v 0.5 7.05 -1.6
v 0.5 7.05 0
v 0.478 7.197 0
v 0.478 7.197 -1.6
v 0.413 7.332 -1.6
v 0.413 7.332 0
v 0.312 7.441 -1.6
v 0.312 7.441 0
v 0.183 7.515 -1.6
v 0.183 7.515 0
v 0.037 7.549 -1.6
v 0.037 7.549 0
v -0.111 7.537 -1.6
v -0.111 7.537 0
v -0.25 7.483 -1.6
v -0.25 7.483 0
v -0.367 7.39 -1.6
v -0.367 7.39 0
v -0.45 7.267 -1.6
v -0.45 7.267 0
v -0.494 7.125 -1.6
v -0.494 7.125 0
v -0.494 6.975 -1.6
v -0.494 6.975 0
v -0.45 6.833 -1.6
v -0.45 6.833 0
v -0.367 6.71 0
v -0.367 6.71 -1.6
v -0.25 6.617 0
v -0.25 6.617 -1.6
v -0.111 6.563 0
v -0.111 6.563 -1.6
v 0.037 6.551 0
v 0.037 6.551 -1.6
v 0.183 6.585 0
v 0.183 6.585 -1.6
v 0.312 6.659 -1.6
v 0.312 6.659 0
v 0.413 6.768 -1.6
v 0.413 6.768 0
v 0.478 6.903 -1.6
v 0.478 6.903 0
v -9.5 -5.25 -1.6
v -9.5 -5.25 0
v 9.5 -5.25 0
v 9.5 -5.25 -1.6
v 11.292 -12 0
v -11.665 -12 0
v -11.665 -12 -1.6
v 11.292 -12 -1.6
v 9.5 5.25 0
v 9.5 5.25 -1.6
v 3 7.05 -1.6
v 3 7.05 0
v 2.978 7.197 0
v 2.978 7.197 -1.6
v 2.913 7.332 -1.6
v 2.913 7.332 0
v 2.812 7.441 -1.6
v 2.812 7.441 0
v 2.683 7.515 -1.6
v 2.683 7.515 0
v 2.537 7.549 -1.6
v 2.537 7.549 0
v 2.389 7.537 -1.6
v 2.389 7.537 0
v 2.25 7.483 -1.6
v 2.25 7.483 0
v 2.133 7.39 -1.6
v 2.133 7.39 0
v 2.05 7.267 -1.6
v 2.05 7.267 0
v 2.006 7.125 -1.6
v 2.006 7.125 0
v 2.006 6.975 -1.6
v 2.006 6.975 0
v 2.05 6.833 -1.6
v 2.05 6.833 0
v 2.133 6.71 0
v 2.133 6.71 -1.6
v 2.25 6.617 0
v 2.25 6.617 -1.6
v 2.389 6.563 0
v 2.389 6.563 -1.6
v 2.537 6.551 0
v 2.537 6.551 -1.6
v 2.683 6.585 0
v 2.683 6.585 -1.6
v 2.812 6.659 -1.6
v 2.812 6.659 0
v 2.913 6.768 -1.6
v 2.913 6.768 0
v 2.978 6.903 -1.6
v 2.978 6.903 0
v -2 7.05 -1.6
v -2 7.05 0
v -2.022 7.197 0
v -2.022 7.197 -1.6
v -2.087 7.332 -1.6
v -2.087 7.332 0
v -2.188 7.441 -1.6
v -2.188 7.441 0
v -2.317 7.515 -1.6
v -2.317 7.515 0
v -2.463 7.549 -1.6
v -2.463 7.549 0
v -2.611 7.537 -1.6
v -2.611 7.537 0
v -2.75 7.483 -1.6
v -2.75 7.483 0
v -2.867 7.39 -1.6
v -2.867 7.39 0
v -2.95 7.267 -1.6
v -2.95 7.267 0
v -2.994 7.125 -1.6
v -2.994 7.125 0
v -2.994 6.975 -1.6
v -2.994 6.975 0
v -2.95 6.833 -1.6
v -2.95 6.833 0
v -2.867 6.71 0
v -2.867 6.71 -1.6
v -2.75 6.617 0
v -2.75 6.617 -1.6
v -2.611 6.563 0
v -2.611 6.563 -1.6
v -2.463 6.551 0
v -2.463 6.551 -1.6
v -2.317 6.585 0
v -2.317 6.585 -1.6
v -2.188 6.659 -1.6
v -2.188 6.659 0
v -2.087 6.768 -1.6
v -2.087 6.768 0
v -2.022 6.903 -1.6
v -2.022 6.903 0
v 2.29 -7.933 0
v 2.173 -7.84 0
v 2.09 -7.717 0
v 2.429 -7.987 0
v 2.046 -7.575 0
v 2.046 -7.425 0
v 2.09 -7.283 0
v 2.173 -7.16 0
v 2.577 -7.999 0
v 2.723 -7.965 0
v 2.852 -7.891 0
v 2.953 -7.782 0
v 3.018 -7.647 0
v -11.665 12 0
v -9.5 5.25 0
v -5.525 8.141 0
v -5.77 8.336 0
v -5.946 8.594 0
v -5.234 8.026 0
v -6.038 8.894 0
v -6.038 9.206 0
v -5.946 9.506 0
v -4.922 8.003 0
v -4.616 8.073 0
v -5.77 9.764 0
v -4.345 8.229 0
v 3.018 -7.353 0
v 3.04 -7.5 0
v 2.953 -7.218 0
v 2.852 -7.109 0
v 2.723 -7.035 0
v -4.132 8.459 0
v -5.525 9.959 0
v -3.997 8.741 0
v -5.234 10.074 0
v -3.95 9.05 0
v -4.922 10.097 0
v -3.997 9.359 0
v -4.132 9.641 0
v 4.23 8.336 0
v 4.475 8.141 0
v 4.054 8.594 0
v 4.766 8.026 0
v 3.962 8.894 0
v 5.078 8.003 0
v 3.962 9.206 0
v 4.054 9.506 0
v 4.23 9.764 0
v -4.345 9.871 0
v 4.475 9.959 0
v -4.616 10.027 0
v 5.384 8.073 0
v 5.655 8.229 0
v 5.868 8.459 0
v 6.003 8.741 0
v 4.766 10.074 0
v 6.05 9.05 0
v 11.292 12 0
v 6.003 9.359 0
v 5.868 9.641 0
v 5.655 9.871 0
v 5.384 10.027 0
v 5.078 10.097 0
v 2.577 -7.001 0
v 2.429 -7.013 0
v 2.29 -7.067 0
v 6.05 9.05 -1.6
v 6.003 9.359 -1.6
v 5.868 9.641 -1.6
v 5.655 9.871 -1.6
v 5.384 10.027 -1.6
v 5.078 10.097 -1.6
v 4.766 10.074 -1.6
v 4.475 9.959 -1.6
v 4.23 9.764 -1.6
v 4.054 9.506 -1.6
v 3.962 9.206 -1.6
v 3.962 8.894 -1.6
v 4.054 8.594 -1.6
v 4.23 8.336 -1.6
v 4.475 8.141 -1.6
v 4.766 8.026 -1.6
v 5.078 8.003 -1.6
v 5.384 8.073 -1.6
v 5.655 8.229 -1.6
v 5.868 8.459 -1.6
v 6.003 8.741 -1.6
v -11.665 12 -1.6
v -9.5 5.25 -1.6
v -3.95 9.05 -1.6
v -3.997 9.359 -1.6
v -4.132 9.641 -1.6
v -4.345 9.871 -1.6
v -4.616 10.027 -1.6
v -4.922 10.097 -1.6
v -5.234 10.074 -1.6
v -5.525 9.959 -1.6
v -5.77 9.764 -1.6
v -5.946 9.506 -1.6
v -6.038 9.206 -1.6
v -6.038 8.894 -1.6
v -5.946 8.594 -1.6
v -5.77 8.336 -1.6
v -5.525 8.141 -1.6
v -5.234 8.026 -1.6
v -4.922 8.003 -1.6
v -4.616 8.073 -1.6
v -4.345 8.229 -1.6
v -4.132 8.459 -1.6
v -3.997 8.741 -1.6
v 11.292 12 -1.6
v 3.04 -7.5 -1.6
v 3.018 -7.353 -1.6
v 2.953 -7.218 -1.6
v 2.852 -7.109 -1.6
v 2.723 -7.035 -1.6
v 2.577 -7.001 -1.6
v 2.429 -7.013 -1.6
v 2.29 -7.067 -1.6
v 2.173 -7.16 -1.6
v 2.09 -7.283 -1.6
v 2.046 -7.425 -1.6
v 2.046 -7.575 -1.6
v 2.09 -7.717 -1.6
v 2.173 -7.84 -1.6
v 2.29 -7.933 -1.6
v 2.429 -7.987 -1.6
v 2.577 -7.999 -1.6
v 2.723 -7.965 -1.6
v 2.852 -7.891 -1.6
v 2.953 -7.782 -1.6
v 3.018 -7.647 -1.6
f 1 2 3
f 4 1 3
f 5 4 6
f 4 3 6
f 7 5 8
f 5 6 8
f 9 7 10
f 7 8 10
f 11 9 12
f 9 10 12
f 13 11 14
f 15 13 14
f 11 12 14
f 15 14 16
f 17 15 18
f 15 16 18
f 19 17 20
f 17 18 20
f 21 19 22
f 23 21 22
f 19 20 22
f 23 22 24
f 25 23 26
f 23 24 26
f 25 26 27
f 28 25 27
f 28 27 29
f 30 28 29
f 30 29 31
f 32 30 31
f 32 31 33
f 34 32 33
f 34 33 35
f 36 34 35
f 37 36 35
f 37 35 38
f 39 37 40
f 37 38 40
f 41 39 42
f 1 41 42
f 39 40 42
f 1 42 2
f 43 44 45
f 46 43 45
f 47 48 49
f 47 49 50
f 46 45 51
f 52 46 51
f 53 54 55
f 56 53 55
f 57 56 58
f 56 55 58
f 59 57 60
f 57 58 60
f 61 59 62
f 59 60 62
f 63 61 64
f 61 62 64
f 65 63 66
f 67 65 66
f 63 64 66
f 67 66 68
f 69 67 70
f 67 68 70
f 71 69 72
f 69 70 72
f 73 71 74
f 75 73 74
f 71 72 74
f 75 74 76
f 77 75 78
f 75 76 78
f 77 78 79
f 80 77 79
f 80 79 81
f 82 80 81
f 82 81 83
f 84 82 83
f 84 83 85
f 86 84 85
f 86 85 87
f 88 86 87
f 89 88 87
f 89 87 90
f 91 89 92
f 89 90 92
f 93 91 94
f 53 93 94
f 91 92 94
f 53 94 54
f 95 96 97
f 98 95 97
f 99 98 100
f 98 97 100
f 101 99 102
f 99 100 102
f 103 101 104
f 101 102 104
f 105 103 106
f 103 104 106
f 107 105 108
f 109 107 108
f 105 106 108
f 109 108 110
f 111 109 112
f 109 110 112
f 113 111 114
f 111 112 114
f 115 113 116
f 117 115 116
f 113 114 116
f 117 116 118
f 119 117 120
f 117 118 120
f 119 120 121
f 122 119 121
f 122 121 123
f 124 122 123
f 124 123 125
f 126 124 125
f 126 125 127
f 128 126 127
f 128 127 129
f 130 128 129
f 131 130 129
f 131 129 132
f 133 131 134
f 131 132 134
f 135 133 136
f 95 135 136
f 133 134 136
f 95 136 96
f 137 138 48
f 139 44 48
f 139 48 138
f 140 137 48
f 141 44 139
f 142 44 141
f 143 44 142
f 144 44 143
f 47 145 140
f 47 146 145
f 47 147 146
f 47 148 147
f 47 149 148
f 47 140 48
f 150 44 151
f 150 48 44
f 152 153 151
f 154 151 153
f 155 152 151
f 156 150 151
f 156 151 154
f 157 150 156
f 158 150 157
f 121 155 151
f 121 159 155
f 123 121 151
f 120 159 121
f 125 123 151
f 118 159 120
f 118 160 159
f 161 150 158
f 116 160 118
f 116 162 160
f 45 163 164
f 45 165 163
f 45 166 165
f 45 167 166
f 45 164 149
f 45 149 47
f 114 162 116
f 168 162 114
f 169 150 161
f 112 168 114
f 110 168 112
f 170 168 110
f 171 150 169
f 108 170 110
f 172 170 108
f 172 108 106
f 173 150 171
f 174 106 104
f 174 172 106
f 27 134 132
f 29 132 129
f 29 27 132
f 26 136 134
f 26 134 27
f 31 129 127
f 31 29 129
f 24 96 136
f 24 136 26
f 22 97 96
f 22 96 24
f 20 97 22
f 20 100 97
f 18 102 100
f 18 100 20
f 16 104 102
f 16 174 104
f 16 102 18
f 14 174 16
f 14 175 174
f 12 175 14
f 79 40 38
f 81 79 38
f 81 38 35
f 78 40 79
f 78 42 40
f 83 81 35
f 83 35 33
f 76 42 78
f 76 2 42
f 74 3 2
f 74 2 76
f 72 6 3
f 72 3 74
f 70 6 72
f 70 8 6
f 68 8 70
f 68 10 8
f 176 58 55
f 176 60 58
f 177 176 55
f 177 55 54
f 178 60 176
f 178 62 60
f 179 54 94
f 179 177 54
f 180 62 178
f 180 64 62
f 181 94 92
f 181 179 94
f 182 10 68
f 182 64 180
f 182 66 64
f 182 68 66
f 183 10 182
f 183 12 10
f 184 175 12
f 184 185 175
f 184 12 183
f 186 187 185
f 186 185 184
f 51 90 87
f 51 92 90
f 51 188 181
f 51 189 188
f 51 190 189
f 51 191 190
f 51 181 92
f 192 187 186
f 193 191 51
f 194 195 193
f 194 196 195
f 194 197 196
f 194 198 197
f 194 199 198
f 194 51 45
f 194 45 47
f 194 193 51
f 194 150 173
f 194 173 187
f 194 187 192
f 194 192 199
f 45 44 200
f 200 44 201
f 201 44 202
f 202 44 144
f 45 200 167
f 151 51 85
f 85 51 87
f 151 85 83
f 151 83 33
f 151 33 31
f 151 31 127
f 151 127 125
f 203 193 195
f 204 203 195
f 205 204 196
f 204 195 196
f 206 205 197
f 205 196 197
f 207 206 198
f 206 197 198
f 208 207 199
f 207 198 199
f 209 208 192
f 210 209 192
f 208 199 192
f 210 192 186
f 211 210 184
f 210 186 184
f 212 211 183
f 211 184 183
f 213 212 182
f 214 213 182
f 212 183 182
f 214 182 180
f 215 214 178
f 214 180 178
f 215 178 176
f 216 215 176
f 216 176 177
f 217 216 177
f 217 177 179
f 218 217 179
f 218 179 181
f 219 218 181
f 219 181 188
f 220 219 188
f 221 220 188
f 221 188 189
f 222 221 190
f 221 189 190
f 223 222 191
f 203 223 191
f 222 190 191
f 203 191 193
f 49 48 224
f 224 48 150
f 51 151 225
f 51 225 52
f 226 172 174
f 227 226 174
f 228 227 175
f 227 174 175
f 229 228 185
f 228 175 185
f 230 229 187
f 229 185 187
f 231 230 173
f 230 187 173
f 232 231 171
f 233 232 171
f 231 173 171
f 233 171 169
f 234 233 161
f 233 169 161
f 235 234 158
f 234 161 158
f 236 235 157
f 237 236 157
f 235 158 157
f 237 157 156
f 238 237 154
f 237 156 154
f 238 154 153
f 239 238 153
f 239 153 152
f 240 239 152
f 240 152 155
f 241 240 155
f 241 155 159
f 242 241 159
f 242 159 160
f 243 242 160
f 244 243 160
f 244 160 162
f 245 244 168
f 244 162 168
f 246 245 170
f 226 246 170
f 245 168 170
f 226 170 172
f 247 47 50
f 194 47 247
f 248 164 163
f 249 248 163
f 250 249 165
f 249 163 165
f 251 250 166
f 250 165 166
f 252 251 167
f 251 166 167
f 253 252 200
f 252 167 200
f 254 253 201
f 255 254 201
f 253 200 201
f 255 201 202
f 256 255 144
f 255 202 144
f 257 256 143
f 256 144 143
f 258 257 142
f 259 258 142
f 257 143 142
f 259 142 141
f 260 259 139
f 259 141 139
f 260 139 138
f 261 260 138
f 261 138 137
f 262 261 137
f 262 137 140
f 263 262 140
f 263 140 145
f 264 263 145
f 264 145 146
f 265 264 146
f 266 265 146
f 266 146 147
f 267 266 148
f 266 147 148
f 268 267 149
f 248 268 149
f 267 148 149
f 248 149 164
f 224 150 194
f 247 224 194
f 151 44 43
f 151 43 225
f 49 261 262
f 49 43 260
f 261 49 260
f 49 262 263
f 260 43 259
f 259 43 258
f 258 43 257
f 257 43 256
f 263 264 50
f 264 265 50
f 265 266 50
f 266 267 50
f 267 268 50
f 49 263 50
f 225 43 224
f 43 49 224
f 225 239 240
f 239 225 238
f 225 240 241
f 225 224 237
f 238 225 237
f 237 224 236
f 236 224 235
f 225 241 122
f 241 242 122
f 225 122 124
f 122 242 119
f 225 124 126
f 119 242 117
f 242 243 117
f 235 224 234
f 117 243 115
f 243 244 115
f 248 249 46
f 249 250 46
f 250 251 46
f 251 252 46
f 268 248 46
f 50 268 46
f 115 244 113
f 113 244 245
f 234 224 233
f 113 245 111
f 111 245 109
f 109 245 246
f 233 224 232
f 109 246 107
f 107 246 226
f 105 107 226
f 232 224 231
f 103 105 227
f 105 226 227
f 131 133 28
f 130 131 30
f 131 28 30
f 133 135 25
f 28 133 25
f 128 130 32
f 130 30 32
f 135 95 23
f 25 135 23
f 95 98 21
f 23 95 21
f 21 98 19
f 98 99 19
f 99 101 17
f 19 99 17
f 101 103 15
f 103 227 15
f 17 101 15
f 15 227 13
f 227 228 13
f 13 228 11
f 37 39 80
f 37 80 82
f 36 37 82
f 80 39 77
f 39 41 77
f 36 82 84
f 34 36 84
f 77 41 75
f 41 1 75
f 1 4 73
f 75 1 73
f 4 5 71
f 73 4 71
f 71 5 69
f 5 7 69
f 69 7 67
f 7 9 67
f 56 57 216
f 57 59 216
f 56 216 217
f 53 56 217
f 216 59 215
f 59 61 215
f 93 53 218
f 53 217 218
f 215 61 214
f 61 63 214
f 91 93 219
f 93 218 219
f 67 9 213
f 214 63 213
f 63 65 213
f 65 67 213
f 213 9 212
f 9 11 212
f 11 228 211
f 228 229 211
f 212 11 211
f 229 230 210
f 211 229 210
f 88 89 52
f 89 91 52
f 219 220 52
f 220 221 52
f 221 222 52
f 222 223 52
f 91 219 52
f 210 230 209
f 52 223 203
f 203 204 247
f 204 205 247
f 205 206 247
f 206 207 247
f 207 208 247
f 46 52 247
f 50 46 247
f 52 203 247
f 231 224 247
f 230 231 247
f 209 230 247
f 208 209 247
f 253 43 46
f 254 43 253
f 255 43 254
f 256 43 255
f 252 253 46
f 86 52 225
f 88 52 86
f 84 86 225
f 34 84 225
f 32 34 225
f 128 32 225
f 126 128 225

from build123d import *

# Parameters (mm, degrees)
F0_W     = 22.956962
F0_H     = 24
F0_R     = 0.5
F0_R_2   = 1.05
F1_DEPTH = 1.6
F2_W     = 19
F2_H     = 10.5
F3_DEPTH = 25


with BuildPart() as f1:
    # F0 (on Top) → F1 (new body)
    with BuildSketch(Plane.XY):
        with Locations((-0.186301, 0)):
            Rectangle(F0_W, F0_H)
        with Locations((2.54, -7.5)):
            Circle(F0_R, mode=Mode.SUBTRACT)
        with Locations((-2.5, 7.05)):
            Circle(F0_R, mode=Mode.SUBTRACT)
        with Locations((-5, 9.05)):
            Circle(F0_R_2, mode=Mode.SUBTRACT)
        with Locations((0, 7.05)):
            Circle(F0_R, mode=Mode.SUBTRACT)
        with Locations((2.5, 7.05)):
            Circle(F0_R, mode=Mode.SUBTRACT)
        with Locations((5, 9.05)):
            Circle(F0_R_2, mode=Mode.SUBTRACT)
    extrude(amount=-F1_DEPTH)

    # F2 (on face) → F3 (cut)
    with BuildSketch(Plane.XY):
        Rectangle(F2_W, F2_H)
    extrude(amount=-F3_DEPTH, mode=Mode.SUBTRACT)


solid = f1.part
